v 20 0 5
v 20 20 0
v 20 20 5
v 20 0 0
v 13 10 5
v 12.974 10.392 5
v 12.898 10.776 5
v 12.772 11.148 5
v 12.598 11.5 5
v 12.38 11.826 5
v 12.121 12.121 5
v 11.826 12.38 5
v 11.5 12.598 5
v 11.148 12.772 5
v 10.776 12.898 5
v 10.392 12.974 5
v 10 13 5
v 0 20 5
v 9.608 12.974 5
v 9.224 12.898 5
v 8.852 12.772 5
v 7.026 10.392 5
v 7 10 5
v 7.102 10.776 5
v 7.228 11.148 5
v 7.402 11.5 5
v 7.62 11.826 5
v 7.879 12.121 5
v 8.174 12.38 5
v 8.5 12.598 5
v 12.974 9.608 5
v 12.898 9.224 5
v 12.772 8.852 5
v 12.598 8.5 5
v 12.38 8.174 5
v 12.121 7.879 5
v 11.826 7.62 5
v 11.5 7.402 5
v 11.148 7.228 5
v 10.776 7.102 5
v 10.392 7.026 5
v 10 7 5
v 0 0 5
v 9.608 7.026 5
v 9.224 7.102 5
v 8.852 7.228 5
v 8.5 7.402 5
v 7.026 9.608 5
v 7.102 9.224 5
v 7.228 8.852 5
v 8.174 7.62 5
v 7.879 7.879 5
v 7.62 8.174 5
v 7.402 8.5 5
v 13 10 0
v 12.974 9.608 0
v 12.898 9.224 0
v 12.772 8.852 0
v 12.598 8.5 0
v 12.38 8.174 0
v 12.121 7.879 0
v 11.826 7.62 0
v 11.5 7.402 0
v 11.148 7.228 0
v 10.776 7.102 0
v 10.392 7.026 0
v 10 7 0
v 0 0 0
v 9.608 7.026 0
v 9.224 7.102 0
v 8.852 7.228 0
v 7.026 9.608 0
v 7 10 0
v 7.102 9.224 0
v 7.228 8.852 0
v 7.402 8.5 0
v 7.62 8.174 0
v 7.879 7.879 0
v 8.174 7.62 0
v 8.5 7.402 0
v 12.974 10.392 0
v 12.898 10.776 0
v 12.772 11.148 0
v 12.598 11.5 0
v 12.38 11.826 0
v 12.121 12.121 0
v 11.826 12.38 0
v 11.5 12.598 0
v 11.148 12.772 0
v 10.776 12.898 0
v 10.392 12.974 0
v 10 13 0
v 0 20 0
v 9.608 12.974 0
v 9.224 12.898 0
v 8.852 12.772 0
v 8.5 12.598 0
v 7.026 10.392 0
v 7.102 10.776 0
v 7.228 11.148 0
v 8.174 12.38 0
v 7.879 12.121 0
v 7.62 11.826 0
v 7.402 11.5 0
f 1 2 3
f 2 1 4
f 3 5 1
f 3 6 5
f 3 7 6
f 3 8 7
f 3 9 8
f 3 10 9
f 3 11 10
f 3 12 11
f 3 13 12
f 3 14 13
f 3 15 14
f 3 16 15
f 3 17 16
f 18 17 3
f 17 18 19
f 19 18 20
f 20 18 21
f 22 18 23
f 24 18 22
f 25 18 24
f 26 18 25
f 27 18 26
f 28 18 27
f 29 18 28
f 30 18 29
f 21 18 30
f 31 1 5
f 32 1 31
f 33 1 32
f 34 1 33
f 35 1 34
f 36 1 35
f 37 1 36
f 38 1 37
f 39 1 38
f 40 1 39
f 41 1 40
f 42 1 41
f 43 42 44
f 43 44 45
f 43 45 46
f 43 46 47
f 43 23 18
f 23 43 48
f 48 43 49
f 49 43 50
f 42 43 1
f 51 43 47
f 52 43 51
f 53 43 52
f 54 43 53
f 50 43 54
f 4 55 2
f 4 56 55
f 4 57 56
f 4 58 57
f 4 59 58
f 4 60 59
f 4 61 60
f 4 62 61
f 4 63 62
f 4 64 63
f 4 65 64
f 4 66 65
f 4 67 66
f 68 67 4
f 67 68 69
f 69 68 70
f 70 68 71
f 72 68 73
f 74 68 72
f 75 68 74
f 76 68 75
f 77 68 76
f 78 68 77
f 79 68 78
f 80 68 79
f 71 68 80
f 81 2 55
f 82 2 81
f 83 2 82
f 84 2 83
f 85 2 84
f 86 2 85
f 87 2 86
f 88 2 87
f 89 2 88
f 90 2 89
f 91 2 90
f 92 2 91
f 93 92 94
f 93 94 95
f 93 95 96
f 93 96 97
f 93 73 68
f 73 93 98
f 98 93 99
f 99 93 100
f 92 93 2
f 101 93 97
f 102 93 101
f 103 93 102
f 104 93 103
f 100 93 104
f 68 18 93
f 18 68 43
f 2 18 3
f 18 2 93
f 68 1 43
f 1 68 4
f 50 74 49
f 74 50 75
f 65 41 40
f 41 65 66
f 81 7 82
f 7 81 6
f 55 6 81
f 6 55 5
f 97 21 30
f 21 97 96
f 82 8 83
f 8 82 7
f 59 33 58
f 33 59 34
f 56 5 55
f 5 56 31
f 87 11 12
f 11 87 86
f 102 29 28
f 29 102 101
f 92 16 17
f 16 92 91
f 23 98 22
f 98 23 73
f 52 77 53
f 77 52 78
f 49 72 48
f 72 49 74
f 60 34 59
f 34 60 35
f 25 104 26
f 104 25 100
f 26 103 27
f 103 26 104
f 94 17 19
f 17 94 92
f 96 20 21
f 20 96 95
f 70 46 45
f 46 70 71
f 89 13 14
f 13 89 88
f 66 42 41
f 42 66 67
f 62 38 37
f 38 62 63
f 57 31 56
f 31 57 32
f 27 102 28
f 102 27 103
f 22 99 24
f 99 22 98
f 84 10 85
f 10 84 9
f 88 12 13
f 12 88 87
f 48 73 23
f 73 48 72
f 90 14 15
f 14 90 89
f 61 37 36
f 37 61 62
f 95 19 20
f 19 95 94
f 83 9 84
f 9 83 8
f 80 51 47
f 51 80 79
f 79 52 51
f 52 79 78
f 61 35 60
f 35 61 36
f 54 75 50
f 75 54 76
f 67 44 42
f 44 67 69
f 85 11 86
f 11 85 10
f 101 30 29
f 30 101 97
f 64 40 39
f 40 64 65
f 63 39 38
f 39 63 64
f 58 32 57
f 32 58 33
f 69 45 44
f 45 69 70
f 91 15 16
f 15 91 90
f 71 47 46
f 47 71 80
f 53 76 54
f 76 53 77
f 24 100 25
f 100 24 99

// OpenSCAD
// units=mm — generated by scad_emitter.py
// part=unnamed
$fn = 48;

difference() { cube([20, 20, 5]); translate([10, 10, -1]) cylinder(h=8, r=3, $fn=$fn); };
